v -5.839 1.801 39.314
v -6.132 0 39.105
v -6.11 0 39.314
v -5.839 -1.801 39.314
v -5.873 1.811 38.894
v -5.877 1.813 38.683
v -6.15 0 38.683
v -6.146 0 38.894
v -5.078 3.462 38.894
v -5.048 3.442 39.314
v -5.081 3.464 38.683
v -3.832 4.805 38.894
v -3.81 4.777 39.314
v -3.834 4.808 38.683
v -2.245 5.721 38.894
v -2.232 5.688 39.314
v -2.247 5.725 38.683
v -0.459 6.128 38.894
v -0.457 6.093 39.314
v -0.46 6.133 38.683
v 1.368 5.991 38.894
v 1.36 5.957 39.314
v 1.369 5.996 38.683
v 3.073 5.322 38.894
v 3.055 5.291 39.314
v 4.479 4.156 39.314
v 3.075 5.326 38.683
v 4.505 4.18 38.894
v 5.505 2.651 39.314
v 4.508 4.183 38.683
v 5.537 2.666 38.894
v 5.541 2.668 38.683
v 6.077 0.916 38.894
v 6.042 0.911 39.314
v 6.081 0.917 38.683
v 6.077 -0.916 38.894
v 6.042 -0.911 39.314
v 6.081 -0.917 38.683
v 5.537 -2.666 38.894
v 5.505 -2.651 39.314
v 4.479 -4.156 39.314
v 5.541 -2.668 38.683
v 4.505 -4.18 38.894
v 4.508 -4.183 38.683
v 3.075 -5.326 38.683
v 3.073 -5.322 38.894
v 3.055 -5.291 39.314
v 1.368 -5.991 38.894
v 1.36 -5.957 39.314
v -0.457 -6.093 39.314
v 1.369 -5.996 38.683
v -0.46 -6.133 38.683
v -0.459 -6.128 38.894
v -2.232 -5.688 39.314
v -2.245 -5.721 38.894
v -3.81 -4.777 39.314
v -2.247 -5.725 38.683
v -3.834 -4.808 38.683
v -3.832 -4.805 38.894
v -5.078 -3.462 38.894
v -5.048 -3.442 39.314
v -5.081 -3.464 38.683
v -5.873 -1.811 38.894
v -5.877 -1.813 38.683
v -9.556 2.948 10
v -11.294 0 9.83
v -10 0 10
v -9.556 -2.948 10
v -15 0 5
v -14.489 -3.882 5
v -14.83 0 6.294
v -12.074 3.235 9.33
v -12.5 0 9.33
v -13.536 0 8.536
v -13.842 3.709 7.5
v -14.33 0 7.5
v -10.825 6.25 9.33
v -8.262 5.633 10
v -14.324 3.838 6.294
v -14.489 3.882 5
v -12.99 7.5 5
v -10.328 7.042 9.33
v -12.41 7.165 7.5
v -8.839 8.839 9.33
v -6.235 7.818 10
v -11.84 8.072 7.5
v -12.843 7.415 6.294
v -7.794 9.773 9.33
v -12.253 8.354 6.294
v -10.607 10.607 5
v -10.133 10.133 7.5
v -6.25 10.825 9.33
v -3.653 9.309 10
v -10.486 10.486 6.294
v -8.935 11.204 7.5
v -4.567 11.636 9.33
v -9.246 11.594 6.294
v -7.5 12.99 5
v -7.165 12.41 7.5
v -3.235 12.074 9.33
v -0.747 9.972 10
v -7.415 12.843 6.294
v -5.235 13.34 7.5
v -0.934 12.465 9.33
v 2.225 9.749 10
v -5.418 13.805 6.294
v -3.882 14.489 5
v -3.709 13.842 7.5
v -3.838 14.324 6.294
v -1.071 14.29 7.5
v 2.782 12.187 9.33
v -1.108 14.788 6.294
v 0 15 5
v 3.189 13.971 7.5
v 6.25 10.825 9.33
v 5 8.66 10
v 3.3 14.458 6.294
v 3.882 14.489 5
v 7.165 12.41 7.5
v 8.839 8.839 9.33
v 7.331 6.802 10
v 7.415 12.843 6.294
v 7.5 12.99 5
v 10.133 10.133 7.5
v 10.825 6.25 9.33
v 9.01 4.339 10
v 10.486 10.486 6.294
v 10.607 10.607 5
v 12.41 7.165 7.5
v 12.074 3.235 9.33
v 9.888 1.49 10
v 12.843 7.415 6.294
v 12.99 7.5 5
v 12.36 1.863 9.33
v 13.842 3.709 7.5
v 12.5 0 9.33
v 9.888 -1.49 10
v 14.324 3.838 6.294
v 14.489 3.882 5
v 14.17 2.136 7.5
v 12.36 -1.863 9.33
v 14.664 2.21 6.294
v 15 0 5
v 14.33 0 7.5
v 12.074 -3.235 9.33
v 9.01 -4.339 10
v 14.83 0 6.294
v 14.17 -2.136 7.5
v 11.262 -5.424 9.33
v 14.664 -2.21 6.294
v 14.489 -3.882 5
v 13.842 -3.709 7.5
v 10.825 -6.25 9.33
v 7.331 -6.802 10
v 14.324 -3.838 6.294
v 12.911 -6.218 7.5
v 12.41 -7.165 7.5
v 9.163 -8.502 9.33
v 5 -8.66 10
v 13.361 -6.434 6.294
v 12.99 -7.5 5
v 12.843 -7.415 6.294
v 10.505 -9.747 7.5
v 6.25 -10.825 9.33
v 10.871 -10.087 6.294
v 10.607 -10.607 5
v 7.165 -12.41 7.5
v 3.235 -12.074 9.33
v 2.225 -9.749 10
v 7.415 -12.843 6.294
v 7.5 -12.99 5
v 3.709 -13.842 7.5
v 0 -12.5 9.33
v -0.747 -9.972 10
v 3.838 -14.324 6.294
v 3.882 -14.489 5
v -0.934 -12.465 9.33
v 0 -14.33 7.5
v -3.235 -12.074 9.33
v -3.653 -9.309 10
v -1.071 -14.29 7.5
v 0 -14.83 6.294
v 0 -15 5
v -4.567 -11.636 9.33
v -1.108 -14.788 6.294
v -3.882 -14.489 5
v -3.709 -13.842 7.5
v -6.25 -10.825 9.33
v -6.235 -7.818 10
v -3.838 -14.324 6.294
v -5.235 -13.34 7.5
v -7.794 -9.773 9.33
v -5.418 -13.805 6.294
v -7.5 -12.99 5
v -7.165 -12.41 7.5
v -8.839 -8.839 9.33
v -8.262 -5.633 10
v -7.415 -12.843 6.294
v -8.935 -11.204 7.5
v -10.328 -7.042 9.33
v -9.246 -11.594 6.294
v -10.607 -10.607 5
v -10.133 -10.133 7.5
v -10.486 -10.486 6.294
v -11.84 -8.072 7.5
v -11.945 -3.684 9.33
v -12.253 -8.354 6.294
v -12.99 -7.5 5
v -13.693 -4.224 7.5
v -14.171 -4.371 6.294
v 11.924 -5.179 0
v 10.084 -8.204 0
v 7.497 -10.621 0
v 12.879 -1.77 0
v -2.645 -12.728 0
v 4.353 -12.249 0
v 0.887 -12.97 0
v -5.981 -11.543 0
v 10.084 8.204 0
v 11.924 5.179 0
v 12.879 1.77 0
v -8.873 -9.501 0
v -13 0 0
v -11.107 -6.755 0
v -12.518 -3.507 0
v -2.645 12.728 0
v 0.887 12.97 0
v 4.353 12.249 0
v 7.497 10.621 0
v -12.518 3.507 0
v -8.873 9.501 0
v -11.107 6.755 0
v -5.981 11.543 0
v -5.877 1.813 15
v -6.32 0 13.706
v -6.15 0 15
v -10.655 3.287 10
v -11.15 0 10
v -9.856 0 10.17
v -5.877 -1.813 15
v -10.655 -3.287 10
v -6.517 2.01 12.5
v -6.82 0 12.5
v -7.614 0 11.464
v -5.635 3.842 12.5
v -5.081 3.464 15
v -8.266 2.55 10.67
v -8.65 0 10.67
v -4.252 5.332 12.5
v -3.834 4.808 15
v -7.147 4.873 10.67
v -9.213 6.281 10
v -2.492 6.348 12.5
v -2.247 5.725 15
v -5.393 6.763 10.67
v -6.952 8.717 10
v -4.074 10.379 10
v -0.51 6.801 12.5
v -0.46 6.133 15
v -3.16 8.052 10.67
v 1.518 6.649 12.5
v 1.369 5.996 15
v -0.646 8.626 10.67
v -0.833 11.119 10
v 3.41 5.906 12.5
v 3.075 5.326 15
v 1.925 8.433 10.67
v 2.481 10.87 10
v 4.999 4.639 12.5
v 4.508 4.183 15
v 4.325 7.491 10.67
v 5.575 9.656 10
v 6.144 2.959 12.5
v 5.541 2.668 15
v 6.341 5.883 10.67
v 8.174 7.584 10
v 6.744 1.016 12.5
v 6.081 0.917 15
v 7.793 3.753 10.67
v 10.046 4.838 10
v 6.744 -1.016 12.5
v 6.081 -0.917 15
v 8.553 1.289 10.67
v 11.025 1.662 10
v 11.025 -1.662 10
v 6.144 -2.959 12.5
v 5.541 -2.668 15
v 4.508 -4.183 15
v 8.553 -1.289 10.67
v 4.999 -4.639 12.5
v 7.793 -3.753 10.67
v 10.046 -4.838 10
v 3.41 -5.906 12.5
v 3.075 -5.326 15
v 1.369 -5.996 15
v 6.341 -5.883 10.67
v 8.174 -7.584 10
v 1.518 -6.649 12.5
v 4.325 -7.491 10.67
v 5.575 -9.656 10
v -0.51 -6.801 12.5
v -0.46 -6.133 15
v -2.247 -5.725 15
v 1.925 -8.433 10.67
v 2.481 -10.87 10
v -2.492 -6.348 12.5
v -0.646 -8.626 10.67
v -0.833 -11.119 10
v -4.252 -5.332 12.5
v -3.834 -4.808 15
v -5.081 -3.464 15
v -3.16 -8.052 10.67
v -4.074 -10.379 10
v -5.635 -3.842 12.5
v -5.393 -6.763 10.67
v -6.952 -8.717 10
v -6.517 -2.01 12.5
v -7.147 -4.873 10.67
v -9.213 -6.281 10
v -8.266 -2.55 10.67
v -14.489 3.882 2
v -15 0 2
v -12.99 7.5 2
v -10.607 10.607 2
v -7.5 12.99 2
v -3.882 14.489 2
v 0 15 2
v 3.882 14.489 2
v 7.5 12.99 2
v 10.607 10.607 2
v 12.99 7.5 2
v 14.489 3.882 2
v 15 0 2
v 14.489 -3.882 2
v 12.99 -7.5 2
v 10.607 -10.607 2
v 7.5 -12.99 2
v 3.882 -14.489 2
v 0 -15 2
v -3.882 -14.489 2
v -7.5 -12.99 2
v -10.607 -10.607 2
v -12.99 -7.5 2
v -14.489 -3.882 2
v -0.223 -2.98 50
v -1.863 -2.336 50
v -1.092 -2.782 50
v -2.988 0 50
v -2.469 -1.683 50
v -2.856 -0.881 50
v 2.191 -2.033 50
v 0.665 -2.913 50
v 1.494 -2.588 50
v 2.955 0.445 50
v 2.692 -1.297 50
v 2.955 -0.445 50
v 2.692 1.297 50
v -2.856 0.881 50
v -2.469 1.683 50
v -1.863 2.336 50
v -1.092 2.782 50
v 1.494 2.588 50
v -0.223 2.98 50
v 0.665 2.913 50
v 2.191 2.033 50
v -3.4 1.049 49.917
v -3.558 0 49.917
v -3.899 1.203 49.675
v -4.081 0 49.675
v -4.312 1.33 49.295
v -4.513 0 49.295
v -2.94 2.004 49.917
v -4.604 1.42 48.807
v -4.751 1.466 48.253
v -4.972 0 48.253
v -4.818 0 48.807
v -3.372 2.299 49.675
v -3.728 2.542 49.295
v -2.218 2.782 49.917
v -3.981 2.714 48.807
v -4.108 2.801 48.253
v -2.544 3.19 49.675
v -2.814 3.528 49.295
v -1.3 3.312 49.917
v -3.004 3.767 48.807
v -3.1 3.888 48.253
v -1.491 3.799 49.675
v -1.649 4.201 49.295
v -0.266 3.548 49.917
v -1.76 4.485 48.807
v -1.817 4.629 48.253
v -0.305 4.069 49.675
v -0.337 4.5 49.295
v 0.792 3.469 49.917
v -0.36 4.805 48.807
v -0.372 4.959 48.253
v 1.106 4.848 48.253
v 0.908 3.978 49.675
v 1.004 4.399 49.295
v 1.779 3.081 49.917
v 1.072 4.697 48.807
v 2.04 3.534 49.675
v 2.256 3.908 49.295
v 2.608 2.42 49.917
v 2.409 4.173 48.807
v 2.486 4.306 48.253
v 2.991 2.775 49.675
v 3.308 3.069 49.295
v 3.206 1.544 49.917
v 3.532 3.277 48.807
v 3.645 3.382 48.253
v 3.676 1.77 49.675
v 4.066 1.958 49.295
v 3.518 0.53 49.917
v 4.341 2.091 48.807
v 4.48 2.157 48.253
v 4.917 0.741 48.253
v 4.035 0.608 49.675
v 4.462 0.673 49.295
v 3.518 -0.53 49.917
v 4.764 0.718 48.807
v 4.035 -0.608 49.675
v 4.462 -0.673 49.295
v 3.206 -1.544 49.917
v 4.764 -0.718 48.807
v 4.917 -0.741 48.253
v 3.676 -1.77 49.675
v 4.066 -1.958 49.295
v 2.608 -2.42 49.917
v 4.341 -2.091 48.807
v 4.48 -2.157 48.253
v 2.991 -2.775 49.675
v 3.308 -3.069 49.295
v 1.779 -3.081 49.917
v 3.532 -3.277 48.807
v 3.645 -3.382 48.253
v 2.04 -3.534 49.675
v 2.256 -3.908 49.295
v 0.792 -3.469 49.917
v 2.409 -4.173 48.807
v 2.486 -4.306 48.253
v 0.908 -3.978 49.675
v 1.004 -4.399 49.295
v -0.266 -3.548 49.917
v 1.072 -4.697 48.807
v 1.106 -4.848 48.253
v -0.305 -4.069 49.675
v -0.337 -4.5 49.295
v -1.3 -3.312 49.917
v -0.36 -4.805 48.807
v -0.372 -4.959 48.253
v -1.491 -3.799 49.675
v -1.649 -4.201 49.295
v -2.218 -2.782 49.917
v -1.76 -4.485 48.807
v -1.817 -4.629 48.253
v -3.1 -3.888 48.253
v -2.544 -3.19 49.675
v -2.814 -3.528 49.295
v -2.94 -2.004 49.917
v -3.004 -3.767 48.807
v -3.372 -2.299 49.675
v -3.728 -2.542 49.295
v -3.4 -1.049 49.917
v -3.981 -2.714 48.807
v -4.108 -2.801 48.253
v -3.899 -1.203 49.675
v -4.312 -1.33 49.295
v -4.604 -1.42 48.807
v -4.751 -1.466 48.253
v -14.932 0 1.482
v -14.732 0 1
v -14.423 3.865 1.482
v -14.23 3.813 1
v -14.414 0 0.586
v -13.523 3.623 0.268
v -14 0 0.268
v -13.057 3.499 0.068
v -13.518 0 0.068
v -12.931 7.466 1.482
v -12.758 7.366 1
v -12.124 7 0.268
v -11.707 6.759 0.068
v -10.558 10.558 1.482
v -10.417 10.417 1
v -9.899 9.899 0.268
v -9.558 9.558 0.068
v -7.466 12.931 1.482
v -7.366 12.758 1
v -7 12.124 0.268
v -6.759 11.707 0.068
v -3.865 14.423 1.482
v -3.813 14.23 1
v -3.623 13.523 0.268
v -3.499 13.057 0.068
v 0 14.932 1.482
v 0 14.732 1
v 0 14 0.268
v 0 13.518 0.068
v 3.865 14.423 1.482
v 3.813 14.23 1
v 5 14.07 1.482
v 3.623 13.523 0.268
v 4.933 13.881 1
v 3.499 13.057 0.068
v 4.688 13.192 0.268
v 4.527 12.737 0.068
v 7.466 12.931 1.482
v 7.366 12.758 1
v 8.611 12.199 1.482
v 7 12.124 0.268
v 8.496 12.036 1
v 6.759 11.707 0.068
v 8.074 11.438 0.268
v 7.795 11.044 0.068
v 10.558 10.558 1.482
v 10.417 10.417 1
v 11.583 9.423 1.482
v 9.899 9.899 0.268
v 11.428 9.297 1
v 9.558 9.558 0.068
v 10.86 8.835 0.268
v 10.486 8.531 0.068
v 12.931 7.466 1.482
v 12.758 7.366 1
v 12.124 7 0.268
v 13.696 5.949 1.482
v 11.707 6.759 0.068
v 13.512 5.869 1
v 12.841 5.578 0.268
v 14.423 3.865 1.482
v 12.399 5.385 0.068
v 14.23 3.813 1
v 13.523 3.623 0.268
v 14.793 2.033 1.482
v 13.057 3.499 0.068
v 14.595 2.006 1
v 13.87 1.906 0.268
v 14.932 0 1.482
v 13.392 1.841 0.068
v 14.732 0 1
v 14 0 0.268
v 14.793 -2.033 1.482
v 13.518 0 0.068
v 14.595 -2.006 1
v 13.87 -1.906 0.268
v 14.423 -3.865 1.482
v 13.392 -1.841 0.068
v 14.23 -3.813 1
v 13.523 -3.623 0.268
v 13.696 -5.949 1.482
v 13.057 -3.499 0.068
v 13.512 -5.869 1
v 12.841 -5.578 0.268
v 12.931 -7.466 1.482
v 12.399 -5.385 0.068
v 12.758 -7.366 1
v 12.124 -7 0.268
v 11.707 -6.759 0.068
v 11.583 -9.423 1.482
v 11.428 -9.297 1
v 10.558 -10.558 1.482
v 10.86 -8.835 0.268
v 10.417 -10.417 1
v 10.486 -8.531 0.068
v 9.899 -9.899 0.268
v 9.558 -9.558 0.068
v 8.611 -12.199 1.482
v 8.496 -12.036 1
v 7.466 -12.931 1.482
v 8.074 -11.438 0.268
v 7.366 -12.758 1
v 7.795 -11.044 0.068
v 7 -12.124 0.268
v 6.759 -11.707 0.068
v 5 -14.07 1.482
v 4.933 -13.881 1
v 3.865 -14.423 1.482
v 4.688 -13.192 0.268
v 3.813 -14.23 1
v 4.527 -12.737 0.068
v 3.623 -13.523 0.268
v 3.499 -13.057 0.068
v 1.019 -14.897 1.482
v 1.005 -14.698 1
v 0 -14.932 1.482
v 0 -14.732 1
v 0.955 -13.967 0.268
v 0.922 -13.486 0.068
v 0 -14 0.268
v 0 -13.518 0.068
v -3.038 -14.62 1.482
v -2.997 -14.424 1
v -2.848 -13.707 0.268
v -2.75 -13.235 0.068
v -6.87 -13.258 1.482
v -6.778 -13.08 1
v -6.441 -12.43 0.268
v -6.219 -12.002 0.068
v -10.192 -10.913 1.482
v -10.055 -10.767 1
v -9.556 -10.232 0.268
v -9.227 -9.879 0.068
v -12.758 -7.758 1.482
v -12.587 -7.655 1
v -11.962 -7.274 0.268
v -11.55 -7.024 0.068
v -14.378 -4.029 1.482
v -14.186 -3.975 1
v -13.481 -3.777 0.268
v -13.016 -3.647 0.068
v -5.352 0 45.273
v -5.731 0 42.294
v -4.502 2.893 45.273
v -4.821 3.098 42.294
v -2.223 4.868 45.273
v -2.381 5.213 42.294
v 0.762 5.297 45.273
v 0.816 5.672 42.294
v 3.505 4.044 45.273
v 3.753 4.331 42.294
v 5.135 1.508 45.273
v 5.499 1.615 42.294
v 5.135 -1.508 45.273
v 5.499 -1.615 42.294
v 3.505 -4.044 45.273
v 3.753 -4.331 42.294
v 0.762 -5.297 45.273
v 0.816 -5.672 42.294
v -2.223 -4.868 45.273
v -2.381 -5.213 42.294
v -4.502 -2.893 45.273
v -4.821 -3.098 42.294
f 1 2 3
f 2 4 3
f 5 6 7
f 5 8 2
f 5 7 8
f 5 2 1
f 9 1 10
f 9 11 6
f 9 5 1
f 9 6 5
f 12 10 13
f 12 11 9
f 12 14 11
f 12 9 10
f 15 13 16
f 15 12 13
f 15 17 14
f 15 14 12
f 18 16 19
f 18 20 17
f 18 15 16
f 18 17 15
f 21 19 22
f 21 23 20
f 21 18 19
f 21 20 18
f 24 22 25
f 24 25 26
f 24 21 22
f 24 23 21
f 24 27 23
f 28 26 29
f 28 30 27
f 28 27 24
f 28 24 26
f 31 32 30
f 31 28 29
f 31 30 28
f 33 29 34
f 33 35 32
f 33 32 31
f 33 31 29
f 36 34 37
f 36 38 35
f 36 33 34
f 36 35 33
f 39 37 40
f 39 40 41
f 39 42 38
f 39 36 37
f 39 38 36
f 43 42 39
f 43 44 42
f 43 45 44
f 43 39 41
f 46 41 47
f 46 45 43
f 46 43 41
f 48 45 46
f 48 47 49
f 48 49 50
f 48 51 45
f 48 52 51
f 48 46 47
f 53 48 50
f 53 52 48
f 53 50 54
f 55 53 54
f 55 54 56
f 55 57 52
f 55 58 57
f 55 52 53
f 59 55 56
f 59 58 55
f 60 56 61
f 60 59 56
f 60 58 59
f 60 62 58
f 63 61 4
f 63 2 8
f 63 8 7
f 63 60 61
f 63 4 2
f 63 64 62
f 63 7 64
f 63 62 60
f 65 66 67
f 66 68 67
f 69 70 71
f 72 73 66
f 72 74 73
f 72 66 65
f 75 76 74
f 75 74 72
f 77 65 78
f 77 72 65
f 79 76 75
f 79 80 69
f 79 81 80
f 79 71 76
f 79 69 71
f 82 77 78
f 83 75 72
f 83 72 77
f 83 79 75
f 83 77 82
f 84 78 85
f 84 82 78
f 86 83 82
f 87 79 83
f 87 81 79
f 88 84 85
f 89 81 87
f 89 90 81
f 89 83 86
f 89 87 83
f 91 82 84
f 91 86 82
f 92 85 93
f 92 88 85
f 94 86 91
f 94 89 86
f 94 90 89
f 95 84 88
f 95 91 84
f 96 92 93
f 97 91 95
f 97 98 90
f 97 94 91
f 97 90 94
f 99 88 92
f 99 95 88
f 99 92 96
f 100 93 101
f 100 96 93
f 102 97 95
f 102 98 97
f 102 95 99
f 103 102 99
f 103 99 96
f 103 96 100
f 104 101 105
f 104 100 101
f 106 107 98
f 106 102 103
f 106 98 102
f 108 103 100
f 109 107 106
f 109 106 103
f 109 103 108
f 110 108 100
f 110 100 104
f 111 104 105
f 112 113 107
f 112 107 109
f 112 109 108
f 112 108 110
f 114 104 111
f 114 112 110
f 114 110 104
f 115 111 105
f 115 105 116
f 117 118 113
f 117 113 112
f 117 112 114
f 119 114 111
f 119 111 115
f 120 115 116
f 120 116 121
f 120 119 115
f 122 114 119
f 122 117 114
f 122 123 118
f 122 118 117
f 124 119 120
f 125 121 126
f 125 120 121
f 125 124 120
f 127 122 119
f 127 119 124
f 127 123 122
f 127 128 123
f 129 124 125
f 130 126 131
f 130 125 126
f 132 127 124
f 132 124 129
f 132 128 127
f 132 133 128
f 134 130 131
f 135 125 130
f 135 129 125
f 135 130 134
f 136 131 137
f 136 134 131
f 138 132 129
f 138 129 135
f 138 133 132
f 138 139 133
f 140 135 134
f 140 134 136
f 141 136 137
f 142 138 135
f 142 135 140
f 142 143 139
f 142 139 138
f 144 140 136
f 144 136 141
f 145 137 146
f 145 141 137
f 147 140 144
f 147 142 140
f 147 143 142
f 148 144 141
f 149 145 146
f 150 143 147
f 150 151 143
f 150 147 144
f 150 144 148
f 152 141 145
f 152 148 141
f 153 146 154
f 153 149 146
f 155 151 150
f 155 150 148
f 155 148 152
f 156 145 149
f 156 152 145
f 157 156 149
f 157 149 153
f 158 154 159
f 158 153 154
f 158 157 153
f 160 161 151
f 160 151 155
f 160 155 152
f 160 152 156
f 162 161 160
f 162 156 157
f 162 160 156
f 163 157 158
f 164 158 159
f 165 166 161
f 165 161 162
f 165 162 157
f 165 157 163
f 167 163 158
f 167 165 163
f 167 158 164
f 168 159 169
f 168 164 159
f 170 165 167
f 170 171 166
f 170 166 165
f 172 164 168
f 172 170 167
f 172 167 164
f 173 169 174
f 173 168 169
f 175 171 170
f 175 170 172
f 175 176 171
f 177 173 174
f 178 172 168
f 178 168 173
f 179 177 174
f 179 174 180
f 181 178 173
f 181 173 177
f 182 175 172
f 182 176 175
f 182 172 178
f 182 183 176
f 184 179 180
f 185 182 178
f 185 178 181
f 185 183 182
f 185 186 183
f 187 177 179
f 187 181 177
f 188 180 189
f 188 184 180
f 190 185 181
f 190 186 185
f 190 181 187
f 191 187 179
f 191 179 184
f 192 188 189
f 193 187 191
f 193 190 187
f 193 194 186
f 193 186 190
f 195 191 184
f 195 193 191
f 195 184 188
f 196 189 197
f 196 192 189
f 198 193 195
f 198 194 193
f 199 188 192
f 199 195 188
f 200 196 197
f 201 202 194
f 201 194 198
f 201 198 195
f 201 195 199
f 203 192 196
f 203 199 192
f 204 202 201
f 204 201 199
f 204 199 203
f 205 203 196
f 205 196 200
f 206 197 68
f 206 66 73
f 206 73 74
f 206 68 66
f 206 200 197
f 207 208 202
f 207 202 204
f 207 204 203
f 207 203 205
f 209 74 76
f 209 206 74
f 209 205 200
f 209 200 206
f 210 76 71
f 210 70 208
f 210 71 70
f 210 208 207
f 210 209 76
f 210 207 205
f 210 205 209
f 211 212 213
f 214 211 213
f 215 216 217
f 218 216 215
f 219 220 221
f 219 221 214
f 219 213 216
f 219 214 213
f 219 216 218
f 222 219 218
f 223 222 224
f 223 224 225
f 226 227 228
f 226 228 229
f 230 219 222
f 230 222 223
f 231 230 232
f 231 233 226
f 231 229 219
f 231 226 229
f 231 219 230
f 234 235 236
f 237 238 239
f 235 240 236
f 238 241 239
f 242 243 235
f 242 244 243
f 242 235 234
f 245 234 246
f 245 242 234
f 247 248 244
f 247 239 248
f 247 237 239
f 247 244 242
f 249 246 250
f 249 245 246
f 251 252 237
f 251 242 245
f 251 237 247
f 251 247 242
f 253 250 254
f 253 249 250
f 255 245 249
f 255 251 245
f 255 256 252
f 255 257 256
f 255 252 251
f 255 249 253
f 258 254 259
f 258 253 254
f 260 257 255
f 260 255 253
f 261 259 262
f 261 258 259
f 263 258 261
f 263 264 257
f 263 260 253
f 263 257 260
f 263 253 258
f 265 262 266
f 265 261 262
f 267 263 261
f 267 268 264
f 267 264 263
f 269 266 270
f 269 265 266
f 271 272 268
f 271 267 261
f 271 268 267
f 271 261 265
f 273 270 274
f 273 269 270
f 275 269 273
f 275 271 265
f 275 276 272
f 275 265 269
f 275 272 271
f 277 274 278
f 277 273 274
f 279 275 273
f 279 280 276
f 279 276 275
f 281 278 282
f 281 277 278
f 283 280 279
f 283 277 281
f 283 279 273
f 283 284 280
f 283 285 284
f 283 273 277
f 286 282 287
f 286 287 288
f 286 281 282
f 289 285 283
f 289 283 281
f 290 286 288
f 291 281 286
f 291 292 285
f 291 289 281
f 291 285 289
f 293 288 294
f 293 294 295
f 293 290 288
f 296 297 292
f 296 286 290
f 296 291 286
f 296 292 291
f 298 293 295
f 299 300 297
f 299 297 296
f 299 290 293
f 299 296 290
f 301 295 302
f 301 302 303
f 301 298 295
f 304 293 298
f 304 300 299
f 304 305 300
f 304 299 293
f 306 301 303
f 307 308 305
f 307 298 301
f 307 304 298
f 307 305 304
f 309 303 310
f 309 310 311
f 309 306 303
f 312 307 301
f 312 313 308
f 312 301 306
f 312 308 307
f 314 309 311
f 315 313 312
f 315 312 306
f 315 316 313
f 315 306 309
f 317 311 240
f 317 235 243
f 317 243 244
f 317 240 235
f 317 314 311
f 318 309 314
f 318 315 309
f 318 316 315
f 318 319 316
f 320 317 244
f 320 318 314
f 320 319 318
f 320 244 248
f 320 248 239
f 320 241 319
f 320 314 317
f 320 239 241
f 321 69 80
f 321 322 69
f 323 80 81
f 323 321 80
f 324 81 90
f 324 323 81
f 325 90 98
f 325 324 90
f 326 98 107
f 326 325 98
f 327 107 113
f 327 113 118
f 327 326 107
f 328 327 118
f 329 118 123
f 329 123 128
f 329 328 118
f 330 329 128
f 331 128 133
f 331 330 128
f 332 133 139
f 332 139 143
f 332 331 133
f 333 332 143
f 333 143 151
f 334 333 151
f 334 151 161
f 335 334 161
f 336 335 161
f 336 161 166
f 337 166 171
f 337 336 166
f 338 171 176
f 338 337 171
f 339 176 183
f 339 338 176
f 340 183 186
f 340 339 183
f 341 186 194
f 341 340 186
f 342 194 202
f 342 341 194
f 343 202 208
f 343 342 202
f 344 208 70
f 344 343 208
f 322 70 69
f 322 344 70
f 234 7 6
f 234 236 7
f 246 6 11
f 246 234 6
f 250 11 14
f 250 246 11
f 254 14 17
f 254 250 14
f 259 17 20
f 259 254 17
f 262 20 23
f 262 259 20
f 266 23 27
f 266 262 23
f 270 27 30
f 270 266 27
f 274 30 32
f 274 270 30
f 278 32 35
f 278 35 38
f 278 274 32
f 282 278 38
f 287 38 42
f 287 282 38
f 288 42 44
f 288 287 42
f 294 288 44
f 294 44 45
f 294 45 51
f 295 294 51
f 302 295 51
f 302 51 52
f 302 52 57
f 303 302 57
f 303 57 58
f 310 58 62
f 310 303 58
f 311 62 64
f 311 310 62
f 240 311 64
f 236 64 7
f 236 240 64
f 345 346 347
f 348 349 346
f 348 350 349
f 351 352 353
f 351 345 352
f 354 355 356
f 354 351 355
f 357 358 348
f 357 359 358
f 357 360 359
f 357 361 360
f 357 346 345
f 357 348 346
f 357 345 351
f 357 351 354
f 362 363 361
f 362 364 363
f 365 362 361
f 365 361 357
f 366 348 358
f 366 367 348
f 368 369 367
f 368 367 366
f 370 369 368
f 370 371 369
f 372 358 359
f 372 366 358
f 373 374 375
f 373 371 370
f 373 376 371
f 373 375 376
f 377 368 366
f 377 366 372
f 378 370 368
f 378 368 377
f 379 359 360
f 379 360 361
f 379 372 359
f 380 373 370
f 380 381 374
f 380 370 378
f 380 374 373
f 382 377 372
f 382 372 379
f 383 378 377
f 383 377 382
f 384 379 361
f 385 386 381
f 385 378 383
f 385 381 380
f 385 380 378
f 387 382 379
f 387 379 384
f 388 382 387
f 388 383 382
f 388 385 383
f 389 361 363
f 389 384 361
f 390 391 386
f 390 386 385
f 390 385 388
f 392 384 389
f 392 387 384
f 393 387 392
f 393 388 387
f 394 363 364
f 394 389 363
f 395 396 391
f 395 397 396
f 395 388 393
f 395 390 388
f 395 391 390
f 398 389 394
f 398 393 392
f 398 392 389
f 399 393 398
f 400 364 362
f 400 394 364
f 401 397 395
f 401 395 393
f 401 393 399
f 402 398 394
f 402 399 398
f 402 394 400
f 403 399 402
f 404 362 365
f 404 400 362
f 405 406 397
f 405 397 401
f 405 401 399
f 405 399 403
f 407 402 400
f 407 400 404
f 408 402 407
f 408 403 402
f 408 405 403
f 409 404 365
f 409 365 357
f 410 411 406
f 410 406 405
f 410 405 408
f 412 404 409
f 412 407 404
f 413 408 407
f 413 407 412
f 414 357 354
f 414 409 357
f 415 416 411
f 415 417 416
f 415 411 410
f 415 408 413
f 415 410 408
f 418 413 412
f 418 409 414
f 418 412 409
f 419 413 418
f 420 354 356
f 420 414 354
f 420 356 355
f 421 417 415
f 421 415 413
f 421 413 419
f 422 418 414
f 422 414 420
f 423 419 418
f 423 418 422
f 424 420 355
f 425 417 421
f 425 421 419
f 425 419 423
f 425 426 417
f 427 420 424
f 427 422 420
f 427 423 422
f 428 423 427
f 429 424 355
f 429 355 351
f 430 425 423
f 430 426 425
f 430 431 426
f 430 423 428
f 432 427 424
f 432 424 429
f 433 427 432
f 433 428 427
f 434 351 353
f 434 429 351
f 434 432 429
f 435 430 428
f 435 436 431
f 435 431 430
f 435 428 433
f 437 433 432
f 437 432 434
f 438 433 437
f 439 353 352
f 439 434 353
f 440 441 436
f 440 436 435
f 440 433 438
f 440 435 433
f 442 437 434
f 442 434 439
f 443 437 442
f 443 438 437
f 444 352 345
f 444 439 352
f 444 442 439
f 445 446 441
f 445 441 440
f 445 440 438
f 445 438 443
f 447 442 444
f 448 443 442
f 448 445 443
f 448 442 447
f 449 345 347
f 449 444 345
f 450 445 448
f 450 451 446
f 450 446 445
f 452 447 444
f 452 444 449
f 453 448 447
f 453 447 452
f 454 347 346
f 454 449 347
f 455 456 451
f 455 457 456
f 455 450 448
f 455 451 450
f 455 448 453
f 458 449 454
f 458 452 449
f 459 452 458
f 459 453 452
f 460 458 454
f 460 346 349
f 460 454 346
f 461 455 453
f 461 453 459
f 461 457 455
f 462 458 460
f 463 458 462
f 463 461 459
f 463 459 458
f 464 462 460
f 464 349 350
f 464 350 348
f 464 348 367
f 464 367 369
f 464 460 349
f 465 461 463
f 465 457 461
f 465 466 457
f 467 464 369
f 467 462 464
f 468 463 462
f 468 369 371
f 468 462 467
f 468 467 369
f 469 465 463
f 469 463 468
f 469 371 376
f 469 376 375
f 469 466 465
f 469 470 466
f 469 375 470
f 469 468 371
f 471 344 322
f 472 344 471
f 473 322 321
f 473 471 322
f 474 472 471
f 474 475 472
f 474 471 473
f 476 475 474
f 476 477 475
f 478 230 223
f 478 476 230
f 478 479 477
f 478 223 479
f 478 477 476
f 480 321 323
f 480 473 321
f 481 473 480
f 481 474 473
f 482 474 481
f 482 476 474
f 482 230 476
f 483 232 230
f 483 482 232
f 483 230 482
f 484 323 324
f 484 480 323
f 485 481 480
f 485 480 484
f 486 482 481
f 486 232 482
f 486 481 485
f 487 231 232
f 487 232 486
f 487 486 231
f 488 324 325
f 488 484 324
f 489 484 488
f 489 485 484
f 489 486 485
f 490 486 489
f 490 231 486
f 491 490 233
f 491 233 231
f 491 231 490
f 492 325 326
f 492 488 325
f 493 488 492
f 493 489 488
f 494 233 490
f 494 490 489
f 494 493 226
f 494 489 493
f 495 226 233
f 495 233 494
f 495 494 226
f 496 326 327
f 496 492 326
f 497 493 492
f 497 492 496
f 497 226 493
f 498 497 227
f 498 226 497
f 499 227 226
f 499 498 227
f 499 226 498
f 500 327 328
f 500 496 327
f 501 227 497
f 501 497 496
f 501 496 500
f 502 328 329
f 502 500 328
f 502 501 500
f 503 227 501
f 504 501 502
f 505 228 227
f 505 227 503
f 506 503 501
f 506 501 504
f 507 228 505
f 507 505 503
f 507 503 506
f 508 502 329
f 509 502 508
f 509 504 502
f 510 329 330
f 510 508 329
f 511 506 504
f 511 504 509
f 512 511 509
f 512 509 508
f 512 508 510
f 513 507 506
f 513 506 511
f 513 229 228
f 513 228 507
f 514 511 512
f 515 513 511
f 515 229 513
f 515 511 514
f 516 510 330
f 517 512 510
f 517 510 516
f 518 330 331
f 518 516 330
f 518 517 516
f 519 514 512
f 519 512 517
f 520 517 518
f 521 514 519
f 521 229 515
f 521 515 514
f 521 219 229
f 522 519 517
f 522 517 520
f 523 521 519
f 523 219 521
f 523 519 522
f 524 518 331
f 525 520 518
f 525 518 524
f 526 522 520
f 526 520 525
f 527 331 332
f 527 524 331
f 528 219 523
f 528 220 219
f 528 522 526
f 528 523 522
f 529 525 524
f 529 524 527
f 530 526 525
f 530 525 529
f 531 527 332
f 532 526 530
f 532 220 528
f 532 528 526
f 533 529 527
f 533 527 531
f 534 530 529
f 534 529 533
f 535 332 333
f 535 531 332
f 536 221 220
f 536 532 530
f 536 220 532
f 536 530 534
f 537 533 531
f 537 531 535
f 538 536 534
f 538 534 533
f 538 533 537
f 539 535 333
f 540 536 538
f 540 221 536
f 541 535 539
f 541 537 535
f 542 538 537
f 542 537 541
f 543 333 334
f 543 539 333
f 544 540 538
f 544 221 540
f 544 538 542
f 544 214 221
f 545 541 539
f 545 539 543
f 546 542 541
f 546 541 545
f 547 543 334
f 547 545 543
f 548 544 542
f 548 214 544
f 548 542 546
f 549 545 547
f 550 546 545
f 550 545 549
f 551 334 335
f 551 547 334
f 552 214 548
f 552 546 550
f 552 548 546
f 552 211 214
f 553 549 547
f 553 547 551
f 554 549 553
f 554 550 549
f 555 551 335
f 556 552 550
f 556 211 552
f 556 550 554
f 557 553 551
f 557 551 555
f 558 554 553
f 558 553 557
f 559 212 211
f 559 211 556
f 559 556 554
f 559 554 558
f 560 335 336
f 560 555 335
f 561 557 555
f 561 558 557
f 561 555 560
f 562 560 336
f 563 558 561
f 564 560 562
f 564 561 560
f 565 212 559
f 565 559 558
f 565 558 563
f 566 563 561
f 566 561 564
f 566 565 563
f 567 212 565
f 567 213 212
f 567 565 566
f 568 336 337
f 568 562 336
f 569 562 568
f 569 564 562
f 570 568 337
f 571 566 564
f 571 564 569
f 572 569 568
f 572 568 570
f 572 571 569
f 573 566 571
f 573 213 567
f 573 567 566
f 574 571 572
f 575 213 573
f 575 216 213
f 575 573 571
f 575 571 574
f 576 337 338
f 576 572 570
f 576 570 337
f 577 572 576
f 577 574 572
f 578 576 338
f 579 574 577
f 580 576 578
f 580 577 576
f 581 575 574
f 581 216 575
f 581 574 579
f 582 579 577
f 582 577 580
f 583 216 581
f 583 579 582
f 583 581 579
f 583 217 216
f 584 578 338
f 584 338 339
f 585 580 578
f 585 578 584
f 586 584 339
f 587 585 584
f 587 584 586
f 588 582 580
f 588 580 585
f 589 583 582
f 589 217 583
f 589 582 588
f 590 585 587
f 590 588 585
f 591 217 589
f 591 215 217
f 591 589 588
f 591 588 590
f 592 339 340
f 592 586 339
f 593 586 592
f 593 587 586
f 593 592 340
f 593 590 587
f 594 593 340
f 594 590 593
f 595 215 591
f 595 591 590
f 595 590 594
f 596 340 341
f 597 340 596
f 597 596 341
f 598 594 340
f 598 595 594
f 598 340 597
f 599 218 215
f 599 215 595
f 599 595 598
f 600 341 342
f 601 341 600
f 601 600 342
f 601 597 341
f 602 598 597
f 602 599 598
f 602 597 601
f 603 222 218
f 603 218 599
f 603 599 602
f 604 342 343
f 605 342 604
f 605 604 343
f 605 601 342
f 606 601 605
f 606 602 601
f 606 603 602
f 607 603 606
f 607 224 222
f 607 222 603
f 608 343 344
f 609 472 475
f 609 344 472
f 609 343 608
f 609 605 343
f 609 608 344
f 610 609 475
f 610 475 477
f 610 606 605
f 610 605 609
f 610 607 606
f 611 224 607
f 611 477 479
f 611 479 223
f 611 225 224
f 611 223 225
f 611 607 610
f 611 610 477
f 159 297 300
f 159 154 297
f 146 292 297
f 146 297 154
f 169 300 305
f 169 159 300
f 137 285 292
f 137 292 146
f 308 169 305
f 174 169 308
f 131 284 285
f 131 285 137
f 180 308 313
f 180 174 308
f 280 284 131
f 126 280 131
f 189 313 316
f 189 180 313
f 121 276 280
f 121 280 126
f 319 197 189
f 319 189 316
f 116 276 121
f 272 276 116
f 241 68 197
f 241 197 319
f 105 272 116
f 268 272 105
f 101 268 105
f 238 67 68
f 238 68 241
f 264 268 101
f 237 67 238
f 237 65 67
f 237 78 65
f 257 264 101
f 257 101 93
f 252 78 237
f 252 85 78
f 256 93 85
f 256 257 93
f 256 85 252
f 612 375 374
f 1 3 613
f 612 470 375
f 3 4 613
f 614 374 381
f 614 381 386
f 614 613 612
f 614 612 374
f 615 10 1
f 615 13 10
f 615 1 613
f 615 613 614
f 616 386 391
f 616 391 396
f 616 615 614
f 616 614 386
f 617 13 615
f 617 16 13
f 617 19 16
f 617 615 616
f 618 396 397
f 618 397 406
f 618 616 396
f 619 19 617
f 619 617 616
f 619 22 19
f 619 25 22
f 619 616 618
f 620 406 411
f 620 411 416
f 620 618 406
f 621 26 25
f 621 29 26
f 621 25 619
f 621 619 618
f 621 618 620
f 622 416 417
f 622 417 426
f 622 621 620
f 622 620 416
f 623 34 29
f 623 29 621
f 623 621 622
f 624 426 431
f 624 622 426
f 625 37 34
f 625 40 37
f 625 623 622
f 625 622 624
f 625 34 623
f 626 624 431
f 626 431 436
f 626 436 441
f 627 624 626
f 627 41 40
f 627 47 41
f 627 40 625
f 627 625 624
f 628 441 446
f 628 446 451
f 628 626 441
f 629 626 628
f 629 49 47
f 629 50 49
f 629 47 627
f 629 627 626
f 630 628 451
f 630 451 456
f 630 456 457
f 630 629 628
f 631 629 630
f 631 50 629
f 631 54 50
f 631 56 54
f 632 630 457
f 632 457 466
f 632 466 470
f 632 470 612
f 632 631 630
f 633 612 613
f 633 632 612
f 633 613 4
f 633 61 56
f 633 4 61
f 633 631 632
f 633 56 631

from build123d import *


with BuildPart() as f1:
    # F0 (on Front) → F1 (revolve)
    with BuildSketch(Plane.XZ):
        with BuildLine():
            Line((0, 0), (0, 50))
            Line((0, 50), (-2.988412, 50))
            ThreePointArc((-2.988412, 50), (-4.310339, 49.500836), (-4.972408, 48.252509))
            Line((-4.972408, 48.252509), (-6.10999, 39.314368))
            ThreePointArc((-6.10999, 39.314368), (-6.139987, 38.999365), (-6.15, 38.683096))
            Line((-6.15, 38.683096), (-6.15, 15))
            ThreePointArc((-6.15, 15), (-7.614466, 11.464466), (-11.15, 10))
            Line((-11.15, 10), (-10, 10))
            ThreePointArc((-10, 10), (-13.535534, 8.535534), (-15, 5))
            Line((-15, 5), (-15, 2))
            ThreePointArc((-15, 2), (-14.414214, 0.585786), (-13, 0))
            Line((-13, 0), (0, 0))
        make_face()
    revolve(axis=Axis((0, 0, 25), (0, 0, -1)))


solid = f1.part
